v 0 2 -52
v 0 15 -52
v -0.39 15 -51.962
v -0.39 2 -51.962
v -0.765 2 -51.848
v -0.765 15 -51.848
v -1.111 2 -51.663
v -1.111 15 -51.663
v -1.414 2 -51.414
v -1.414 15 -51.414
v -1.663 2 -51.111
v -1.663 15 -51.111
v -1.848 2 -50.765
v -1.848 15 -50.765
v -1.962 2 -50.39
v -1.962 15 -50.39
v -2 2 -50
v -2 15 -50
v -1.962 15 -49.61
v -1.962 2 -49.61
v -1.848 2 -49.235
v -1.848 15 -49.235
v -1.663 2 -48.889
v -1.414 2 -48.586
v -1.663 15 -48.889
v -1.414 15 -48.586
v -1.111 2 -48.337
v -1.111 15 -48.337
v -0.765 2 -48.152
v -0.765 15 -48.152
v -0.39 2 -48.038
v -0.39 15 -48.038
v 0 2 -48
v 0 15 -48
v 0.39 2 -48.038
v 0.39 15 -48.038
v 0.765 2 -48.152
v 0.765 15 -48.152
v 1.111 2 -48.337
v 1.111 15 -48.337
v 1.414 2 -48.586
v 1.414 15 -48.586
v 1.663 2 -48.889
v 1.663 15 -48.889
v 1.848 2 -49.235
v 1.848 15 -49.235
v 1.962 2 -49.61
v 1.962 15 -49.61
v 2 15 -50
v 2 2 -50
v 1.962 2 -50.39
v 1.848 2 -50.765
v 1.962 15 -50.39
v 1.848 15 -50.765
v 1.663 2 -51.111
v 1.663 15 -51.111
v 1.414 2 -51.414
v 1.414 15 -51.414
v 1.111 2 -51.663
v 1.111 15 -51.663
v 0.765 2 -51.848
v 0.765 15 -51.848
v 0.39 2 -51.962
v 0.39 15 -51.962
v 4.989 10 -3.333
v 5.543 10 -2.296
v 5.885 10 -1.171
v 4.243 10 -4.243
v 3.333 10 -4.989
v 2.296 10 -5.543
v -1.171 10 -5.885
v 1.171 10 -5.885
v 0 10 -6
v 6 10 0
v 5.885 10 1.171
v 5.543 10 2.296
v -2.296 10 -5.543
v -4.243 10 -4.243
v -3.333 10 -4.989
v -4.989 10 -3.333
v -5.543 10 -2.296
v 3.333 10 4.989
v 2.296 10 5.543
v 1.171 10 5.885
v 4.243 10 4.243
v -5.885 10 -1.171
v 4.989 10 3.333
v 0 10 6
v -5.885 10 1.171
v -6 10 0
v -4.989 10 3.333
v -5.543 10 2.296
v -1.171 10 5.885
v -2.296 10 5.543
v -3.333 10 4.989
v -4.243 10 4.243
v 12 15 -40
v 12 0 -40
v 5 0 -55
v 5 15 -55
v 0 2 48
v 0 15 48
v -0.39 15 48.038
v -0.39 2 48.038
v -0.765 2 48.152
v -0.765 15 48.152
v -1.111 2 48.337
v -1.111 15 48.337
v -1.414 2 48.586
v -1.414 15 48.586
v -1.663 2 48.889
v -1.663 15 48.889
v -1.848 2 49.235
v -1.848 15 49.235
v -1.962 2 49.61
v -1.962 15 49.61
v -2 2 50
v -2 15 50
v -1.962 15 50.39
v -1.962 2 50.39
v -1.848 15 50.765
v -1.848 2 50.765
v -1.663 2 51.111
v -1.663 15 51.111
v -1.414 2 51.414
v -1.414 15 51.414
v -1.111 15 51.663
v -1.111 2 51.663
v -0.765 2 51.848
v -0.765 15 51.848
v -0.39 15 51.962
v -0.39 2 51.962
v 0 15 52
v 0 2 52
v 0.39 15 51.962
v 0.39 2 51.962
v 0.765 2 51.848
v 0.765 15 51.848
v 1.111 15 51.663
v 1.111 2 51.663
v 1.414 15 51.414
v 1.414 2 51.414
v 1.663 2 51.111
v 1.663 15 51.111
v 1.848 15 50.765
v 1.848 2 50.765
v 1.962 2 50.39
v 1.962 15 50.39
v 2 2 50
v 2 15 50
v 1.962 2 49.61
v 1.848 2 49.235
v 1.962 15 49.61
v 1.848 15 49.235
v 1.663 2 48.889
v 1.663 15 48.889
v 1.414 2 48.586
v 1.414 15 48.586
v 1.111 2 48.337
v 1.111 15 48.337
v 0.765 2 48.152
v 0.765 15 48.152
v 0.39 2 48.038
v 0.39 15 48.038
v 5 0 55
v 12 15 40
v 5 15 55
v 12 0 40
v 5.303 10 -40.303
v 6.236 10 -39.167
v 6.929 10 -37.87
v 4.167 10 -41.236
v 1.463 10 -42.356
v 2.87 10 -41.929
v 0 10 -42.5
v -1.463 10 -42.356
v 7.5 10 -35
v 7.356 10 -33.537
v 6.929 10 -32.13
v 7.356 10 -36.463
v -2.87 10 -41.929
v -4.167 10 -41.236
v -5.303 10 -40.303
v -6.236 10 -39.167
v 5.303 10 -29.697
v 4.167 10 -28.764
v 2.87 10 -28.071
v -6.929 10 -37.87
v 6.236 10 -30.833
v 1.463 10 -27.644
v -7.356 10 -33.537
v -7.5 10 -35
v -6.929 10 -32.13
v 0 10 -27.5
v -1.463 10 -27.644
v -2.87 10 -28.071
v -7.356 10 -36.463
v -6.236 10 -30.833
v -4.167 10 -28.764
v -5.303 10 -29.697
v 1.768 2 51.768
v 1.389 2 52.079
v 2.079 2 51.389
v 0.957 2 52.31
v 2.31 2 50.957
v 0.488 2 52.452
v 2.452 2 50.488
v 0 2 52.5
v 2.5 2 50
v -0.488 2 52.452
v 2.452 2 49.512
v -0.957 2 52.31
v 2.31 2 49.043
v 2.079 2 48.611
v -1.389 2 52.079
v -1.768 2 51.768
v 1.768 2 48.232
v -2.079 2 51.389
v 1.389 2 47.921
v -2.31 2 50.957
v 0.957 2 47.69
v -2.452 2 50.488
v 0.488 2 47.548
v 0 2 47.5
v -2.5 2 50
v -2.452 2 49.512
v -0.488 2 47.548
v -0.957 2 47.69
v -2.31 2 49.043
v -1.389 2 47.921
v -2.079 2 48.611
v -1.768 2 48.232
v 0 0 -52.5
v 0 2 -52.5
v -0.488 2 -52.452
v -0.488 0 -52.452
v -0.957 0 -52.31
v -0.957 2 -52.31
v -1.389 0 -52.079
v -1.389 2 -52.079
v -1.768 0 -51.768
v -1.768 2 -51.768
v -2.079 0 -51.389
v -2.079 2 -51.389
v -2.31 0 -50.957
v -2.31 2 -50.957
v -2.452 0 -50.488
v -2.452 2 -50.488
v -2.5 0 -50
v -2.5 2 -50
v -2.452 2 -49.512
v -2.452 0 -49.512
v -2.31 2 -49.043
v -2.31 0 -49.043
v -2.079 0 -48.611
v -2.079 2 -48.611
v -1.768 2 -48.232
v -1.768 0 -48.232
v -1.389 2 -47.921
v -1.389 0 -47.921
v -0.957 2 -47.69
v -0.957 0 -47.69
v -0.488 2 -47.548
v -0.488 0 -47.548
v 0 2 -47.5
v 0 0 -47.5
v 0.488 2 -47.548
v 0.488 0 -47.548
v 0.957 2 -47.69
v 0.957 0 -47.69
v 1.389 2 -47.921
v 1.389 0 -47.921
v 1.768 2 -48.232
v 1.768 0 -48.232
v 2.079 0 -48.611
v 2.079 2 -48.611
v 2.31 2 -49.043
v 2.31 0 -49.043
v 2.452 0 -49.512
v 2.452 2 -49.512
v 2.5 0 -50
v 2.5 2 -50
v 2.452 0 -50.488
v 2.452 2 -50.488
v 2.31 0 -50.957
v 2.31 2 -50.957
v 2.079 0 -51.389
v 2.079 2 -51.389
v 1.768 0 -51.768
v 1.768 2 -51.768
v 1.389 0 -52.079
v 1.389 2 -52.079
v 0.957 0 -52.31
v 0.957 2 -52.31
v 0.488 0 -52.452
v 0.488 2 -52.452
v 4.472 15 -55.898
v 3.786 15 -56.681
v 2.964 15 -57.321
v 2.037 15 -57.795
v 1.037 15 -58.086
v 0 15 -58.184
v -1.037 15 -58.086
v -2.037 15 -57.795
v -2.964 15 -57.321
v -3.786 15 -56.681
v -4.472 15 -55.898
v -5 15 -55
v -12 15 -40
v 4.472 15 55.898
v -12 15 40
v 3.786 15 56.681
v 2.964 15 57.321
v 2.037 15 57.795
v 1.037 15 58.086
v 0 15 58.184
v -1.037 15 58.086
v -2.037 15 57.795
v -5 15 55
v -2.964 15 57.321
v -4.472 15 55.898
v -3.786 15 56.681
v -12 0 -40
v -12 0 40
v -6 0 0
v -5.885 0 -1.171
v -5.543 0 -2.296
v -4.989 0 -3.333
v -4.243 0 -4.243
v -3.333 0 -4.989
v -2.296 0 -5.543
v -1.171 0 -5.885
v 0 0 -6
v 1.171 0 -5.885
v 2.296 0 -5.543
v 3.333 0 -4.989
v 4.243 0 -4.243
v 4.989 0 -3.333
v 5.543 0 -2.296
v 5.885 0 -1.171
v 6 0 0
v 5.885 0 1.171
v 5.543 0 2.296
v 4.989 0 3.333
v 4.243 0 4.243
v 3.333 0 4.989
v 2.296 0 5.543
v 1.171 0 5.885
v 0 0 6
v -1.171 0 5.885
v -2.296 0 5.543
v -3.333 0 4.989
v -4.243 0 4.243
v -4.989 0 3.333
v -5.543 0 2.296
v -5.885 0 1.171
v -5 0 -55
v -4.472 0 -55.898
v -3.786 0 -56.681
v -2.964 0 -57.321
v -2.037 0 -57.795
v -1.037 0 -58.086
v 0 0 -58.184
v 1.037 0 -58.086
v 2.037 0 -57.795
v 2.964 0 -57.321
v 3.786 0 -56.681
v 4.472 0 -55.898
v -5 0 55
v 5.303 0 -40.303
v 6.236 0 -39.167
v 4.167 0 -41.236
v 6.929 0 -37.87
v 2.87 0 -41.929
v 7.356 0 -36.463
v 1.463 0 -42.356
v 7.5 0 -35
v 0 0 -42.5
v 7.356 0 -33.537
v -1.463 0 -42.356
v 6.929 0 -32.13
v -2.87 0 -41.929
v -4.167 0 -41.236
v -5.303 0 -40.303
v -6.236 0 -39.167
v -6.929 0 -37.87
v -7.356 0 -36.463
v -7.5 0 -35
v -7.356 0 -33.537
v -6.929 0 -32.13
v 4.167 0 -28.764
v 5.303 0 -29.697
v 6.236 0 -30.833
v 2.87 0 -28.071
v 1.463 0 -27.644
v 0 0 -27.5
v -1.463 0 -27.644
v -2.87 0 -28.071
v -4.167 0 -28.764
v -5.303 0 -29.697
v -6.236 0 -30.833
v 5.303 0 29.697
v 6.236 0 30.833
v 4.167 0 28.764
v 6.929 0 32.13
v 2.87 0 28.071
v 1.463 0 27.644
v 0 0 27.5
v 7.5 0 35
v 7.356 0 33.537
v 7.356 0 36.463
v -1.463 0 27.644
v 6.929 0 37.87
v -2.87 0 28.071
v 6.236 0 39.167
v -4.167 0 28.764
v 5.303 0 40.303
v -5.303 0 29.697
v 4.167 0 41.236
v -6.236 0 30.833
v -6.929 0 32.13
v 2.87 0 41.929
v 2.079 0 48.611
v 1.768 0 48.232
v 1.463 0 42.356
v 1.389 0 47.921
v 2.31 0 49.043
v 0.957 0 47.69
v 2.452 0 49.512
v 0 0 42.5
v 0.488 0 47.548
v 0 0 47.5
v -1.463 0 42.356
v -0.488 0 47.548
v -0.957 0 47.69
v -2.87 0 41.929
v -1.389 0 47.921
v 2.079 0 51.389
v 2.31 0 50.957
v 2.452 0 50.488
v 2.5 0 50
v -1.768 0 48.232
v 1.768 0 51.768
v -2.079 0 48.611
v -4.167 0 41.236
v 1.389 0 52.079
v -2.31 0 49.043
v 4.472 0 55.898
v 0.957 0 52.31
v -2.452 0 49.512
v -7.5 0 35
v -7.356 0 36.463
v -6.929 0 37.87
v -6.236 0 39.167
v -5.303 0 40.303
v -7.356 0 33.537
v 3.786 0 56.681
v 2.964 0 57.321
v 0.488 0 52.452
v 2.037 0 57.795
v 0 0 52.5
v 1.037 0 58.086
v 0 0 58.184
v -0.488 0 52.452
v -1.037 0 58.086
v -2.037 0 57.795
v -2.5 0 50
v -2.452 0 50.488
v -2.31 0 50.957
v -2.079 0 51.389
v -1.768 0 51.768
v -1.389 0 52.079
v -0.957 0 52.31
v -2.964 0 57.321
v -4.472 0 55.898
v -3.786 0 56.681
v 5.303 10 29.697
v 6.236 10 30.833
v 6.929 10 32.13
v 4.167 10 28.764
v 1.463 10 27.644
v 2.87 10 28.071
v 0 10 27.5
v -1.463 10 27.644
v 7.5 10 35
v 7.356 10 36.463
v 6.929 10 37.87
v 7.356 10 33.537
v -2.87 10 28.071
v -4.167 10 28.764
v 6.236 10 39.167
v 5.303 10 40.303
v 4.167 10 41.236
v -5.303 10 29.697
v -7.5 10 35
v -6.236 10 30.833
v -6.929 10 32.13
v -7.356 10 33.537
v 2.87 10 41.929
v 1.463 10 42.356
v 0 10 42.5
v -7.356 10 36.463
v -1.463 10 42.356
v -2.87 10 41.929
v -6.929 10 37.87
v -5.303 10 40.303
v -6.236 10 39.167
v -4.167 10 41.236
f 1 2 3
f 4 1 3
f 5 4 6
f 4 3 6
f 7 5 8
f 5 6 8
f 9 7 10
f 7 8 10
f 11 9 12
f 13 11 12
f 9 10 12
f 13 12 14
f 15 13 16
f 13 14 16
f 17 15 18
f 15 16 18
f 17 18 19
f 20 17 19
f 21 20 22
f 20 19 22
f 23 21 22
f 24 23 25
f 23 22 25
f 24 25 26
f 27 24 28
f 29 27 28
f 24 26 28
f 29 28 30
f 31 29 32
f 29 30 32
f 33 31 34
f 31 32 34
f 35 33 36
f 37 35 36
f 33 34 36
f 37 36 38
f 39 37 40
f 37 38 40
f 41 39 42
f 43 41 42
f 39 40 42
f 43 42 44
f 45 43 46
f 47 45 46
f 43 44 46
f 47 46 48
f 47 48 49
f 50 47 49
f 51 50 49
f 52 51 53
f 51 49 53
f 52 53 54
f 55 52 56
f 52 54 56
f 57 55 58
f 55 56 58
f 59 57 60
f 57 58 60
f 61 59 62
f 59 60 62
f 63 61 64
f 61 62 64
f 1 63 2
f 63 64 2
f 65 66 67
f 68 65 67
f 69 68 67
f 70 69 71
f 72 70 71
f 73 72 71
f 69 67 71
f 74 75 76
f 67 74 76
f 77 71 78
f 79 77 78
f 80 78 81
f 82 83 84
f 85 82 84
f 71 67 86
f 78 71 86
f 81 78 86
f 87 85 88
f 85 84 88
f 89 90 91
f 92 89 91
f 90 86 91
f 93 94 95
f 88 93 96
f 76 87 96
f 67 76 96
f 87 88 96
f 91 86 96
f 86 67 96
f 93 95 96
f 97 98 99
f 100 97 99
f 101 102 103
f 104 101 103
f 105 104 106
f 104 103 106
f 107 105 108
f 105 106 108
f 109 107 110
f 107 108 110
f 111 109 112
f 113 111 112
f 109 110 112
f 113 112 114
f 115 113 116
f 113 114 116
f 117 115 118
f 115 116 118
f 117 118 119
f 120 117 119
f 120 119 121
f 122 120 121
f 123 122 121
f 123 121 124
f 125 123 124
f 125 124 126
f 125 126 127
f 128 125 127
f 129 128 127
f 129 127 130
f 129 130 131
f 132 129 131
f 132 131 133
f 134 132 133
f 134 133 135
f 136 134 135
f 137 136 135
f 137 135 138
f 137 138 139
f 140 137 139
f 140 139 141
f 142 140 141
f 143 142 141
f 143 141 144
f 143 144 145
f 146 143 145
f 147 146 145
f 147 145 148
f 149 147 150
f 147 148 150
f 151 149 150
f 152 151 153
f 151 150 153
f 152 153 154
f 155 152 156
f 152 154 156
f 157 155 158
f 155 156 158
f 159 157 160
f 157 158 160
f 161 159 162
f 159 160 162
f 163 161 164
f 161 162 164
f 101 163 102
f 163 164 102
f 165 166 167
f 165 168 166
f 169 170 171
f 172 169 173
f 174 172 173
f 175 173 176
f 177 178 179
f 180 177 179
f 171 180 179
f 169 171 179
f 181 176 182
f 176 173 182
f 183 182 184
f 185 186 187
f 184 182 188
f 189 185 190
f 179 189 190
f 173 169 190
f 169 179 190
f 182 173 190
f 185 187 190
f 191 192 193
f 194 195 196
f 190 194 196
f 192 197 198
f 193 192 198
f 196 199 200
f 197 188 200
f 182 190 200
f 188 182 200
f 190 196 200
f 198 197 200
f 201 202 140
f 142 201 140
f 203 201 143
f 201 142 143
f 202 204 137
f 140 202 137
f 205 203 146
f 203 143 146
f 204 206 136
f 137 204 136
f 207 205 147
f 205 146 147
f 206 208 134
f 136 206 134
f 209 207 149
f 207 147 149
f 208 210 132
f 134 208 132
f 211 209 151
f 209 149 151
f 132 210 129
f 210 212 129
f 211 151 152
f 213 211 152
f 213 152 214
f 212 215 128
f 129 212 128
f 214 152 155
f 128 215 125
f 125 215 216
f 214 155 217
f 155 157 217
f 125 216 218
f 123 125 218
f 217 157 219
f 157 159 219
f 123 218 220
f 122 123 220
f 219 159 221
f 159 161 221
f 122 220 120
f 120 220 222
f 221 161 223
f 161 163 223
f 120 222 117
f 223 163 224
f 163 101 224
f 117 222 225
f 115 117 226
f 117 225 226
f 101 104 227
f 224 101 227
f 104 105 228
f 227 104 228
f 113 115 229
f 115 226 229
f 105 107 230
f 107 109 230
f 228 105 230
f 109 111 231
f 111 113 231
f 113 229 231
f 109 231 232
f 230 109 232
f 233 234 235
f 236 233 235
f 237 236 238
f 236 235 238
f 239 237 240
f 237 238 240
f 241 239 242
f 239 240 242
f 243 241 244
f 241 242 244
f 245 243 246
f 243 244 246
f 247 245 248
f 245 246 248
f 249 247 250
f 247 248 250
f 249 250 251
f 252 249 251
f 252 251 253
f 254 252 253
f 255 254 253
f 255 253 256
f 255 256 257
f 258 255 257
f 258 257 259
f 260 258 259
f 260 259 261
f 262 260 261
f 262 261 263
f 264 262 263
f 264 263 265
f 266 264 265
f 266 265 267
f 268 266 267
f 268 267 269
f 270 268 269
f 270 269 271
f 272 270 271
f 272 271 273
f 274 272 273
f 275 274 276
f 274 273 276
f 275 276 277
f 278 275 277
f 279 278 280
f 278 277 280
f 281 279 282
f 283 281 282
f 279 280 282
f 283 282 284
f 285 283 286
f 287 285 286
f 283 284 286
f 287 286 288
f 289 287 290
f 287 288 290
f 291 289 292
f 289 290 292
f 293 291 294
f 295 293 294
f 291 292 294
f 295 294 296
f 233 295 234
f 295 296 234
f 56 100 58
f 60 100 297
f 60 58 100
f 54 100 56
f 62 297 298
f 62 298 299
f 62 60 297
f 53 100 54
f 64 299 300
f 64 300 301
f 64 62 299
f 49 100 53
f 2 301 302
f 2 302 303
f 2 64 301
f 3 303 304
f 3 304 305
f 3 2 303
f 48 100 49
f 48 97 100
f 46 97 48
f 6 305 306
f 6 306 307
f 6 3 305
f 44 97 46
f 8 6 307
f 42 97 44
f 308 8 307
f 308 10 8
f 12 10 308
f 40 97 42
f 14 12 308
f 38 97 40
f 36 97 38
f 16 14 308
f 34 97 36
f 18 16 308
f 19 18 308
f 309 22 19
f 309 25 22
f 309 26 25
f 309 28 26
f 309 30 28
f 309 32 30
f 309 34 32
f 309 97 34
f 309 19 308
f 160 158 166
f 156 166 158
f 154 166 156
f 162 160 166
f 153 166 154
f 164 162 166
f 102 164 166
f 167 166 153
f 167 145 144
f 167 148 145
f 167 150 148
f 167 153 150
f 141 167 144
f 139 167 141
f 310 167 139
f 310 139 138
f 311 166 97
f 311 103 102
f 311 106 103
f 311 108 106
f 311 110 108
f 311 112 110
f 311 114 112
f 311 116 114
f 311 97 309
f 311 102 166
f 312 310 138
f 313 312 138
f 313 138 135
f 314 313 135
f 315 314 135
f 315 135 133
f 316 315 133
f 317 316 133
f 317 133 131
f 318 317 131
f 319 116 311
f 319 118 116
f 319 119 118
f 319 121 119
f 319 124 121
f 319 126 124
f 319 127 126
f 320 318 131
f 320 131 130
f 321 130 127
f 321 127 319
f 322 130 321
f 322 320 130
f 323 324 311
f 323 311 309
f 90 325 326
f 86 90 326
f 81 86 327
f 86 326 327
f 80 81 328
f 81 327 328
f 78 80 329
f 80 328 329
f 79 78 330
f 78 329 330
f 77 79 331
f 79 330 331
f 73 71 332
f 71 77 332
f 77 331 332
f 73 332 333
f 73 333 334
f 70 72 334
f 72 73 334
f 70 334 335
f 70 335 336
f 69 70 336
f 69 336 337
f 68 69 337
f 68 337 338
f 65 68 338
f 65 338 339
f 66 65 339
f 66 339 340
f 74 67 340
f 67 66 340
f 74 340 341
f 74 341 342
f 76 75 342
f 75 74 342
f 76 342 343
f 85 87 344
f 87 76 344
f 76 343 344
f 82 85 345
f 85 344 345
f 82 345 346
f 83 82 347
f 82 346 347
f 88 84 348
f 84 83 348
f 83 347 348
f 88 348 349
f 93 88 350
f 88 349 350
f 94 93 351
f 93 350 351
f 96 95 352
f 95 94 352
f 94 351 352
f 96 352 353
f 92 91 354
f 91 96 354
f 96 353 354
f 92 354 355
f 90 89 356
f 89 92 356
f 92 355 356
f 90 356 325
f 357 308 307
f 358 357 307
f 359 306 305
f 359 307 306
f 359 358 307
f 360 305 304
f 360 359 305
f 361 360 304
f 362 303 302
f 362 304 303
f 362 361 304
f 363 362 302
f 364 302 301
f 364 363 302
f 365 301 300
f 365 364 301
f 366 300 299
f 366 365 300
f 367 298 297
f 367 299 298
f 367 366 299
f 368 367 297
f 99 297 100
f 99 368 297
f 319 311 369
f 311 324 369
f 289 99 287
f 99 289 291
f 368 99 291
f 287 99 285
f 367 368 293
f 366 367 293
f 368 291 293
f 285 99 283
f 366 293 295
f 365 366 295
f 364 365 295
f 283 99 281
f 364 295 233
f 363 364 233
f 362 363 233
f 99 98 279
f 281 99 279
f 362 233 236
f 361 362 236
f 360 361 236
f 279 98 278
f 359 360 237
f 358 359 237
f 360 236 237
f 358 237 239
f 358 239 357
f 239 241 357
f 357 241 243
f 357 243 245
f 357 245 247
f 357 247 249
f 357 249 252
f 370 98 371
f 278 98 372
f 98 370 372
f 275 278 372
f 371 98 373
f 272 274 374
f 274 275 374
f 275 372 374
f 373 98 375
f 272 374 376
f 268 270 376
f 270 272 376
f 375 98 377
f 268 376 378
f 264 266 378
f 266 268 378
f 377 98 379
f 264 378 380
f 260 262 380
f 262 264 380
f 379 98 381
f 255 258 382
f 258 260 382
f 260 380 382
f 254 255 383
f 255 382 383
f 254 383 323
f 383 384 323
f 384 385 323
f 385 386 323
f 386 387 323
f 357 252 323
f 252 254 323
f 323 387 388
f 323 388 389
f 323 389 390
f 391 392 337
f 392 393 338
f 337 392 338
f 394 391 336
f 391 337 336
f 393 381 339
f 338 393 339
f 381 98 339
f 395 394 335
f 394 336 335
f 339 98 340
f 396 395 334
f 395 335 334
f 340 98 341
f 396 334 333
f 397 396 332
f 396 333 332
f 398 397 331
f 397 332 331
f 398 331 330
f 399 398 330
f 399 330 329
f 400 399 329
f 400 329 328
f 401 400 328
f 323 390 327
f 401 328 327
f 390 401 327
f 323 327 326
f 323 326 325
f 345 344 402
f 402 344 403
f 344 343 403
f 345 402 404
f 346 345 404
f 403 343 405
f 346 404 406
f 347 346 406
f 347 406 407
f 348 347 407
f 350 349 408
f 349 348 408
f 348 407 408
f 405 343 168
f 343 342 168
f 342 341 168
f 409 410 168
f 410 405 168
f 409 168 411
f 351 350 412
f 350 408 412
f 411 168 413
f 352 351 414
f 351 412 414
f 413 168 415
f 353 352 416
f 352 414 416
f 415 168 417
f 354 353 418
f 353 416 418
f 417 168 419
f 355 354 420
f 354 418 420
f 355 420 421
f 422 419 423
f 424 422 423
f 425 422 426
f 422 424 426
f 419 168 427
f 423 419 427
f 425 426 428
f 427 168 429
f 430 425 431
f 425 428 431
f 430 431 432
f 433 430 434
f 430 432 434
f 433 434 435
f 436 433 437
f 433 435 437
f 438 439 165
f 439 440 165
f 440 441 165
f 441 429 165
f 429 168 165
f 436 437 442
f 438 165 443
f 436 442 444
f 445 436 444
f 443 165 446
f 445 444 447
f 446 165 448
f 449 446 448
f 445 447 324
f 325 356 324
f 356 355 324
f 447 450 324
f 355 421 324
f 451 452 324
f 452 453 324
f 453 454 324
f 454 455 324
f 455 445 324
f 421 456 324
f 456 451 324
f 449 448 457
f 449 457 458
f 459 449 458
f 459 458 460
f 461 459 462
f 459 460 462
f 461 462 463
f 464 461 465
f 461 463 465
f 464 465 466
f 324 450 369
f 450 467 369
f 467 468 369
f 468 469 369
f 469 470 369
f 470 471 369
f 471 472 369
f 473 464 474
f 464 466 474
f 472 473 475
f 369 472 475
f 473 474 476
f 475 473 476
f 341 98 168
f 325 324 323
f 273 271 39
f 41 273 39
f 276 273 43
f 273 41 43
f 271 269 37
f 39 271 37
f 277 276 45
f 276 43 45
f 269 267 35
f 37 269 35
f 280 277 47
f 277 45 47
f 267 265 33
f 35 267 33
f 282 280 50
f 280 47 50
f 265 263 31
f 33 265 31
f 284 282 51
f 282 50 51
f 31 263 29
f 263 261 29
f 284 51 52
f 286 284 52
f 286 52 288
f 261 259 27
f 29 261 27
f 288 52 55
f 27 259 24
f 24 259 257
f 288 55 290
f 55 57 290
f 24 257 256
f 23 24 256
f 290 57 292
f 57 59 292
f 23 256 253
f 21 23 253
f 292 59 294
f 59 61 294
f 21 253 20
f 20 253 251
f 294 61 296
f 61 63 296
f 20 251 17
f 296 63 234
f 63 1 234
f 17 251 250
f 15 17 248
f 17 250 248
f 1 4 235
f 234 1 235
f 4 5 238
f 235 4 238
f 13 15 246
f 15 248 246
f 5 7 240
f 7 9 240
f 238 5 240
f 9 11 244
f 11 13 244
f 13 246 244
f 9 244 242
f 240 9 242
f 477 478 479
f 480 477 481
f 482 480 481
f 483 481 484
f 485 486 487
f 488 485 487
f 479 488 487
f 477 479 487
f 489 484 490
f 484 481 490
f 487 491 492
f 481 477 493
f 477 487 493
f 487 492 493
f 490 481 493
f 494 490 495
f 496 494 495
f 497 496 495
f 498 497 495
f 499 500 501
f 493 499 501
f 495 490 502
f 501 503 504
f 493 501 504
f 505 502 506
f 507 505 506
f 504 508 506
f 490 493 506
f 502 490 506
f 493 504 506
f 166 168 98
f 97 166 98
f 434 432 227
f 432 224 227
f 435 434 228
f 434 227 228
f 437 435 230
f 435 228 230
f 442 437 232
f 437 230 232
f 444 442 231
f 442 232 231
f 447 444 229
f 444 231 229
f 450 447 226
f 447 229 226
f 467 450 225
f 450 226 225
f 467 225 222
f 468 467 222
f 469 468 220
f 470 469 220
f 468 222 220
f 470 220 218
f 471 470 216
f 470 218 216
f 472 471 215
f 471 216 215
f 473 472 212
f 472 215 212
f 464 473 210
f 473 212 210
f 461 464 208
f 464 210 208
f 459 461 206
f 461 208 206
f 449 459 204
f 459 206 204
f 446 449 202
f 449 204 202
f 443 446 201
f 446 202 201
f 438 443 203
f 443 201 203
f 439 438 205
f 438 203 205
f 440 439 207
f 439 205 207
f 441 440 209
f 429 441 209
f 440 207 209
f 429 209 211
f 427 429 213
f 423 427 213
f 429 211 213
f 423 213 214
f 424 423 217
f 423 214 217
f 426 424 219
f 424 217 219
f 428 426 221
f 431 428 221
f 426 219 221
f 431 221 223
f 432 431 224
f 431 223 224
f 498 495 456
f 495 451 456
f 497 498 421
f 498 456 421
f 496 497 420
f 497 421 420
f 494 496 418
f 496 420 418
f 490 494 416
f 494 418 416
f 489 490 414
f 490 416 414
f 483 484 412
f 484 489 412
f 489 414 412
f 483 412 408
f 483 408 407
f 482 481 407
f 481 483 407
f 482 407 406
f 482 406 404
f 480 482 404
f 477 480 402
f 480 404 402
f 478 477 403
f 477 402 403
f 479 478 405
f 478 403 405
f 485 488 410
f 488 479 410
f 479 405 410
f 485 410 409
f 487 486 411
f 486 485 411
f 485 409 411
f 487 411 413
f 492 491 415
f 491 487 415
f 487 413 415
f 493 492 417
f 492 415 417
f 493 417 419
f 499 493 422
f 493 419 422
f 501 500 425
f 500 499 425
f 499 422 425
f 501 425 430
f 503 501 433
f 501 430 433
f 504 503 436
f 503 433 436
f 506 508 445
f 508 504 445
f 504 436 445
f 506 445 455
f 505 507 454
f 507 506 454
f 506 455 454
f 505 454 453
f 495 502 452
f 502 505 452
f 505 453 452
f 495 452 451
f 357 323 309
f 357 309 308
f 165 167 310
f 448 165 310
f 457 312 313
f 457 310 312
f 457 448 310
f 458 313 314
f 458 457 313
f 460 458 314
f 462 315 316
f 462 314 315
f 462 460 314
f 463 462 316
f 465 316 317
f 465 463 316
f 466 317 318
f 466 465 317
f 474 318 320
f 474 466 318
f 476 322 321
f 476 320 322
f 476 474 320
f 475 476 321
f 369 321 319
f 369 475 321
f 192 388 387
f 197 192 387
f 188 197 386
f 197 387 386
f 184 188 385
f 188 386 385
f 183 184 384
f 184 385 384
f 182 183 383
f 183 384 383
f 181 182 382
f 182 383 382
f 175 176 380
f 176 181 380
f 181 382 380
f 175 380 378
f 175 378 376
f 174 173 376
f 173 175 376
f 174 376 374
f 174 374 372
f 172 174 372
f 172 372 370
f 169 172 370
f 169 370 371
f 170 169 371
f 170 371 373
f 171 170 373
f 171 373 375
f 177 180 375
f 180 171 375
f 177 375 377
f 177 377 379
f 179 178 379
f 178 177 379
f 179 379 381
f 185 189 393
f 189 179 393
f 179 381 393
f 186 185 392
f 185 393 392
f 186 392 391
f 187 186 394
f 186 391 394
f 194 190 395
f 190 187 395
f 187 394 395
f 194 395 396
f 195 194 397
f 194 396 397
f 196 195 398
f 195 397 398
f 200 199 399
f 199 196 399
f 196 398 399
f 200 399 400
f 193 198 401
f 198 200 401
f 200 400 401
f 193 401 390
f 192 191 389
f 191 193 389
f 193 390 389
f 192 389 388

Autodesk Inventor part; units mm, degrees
ref_plane "YZ Plane" through (0, 0, 0) normal (1, 0, 0) x (0, 1, 0)
ref_plane "XZ Plane" through (0, 0, 0) normal (0, 1, 0) x (-1, 0, 0)
ref_plane "XY Plane" through (0, 0, 0) normal (0, 0, 1) x (1, 0, 0)
sketch "Sketch1" plane through (0, 0, 0) normal (0, 1, 0) x (-1, 0, 0)
  circle A0 centre (0, 35) radius 7.5
  circle A1 centre (0, -35) radius 7.5
  circle A2 centre (0, 0) radius 6
  dimension "d0" = 15
  dimension "d1" = 35
  dimension "d2" = 15
  dimension "d3" = 35
  dimension "d4" = 12
sketch "Sketch2" plane through (0, 0, 0) normal (0, 1, 0) x (-1, 0, 0)
  line L0 (12, 40) -> (12, -40)
  line L1 (12, -40) -> (5, -55)
  line L2 (12, 40) -> (5, 55)
  line L3 (0, 53.0774) -> (0, -54.9051) construction
  line L4 (-12, 40) -> (-12, -40)
  line L5 (-12, -40) -> (-5, -55)
  line L6 (-12, 40) -> (-5, 55)
  arc A0 (5, 55) -> (-5, 55) centre (0, 52.6667) ccw
  arc A1 (-5, -55) -> (5, -55) centre (0, -52.6667) ccw
  point P0 (0, 0)
  dimension "d5" = 12
  dimension "d6" = 40
  dimension "d7" = 40
  dimension "d8" = 15
  dimension "d9" = 7
  dimension "d10" = 15
  dimension "d11" = 7
extrude "Extrusion1" add sketch "Sketch2" along normal blind 15
extrude "Extrusion2" cut sketch "Sketch1" along normal blind 10
sketch "Sketch3" plane through (0, 0, 0) normal (0, -1, 0) x (1, 0, 0)
  point P0 (0, 0)
  point P1 (0, -50)
  point P2 (0, 50)
  dimension "d16" = 50
  dimension "d17" = 50
hole "Hole1" at (0, 0, -50) at (0, 0, 50) direction (0, 1, 0) diameter 4 end through all counterbore diameter 5 counterbore depth 2
properties part number "Rahmen_Y_Halterung_v1"
